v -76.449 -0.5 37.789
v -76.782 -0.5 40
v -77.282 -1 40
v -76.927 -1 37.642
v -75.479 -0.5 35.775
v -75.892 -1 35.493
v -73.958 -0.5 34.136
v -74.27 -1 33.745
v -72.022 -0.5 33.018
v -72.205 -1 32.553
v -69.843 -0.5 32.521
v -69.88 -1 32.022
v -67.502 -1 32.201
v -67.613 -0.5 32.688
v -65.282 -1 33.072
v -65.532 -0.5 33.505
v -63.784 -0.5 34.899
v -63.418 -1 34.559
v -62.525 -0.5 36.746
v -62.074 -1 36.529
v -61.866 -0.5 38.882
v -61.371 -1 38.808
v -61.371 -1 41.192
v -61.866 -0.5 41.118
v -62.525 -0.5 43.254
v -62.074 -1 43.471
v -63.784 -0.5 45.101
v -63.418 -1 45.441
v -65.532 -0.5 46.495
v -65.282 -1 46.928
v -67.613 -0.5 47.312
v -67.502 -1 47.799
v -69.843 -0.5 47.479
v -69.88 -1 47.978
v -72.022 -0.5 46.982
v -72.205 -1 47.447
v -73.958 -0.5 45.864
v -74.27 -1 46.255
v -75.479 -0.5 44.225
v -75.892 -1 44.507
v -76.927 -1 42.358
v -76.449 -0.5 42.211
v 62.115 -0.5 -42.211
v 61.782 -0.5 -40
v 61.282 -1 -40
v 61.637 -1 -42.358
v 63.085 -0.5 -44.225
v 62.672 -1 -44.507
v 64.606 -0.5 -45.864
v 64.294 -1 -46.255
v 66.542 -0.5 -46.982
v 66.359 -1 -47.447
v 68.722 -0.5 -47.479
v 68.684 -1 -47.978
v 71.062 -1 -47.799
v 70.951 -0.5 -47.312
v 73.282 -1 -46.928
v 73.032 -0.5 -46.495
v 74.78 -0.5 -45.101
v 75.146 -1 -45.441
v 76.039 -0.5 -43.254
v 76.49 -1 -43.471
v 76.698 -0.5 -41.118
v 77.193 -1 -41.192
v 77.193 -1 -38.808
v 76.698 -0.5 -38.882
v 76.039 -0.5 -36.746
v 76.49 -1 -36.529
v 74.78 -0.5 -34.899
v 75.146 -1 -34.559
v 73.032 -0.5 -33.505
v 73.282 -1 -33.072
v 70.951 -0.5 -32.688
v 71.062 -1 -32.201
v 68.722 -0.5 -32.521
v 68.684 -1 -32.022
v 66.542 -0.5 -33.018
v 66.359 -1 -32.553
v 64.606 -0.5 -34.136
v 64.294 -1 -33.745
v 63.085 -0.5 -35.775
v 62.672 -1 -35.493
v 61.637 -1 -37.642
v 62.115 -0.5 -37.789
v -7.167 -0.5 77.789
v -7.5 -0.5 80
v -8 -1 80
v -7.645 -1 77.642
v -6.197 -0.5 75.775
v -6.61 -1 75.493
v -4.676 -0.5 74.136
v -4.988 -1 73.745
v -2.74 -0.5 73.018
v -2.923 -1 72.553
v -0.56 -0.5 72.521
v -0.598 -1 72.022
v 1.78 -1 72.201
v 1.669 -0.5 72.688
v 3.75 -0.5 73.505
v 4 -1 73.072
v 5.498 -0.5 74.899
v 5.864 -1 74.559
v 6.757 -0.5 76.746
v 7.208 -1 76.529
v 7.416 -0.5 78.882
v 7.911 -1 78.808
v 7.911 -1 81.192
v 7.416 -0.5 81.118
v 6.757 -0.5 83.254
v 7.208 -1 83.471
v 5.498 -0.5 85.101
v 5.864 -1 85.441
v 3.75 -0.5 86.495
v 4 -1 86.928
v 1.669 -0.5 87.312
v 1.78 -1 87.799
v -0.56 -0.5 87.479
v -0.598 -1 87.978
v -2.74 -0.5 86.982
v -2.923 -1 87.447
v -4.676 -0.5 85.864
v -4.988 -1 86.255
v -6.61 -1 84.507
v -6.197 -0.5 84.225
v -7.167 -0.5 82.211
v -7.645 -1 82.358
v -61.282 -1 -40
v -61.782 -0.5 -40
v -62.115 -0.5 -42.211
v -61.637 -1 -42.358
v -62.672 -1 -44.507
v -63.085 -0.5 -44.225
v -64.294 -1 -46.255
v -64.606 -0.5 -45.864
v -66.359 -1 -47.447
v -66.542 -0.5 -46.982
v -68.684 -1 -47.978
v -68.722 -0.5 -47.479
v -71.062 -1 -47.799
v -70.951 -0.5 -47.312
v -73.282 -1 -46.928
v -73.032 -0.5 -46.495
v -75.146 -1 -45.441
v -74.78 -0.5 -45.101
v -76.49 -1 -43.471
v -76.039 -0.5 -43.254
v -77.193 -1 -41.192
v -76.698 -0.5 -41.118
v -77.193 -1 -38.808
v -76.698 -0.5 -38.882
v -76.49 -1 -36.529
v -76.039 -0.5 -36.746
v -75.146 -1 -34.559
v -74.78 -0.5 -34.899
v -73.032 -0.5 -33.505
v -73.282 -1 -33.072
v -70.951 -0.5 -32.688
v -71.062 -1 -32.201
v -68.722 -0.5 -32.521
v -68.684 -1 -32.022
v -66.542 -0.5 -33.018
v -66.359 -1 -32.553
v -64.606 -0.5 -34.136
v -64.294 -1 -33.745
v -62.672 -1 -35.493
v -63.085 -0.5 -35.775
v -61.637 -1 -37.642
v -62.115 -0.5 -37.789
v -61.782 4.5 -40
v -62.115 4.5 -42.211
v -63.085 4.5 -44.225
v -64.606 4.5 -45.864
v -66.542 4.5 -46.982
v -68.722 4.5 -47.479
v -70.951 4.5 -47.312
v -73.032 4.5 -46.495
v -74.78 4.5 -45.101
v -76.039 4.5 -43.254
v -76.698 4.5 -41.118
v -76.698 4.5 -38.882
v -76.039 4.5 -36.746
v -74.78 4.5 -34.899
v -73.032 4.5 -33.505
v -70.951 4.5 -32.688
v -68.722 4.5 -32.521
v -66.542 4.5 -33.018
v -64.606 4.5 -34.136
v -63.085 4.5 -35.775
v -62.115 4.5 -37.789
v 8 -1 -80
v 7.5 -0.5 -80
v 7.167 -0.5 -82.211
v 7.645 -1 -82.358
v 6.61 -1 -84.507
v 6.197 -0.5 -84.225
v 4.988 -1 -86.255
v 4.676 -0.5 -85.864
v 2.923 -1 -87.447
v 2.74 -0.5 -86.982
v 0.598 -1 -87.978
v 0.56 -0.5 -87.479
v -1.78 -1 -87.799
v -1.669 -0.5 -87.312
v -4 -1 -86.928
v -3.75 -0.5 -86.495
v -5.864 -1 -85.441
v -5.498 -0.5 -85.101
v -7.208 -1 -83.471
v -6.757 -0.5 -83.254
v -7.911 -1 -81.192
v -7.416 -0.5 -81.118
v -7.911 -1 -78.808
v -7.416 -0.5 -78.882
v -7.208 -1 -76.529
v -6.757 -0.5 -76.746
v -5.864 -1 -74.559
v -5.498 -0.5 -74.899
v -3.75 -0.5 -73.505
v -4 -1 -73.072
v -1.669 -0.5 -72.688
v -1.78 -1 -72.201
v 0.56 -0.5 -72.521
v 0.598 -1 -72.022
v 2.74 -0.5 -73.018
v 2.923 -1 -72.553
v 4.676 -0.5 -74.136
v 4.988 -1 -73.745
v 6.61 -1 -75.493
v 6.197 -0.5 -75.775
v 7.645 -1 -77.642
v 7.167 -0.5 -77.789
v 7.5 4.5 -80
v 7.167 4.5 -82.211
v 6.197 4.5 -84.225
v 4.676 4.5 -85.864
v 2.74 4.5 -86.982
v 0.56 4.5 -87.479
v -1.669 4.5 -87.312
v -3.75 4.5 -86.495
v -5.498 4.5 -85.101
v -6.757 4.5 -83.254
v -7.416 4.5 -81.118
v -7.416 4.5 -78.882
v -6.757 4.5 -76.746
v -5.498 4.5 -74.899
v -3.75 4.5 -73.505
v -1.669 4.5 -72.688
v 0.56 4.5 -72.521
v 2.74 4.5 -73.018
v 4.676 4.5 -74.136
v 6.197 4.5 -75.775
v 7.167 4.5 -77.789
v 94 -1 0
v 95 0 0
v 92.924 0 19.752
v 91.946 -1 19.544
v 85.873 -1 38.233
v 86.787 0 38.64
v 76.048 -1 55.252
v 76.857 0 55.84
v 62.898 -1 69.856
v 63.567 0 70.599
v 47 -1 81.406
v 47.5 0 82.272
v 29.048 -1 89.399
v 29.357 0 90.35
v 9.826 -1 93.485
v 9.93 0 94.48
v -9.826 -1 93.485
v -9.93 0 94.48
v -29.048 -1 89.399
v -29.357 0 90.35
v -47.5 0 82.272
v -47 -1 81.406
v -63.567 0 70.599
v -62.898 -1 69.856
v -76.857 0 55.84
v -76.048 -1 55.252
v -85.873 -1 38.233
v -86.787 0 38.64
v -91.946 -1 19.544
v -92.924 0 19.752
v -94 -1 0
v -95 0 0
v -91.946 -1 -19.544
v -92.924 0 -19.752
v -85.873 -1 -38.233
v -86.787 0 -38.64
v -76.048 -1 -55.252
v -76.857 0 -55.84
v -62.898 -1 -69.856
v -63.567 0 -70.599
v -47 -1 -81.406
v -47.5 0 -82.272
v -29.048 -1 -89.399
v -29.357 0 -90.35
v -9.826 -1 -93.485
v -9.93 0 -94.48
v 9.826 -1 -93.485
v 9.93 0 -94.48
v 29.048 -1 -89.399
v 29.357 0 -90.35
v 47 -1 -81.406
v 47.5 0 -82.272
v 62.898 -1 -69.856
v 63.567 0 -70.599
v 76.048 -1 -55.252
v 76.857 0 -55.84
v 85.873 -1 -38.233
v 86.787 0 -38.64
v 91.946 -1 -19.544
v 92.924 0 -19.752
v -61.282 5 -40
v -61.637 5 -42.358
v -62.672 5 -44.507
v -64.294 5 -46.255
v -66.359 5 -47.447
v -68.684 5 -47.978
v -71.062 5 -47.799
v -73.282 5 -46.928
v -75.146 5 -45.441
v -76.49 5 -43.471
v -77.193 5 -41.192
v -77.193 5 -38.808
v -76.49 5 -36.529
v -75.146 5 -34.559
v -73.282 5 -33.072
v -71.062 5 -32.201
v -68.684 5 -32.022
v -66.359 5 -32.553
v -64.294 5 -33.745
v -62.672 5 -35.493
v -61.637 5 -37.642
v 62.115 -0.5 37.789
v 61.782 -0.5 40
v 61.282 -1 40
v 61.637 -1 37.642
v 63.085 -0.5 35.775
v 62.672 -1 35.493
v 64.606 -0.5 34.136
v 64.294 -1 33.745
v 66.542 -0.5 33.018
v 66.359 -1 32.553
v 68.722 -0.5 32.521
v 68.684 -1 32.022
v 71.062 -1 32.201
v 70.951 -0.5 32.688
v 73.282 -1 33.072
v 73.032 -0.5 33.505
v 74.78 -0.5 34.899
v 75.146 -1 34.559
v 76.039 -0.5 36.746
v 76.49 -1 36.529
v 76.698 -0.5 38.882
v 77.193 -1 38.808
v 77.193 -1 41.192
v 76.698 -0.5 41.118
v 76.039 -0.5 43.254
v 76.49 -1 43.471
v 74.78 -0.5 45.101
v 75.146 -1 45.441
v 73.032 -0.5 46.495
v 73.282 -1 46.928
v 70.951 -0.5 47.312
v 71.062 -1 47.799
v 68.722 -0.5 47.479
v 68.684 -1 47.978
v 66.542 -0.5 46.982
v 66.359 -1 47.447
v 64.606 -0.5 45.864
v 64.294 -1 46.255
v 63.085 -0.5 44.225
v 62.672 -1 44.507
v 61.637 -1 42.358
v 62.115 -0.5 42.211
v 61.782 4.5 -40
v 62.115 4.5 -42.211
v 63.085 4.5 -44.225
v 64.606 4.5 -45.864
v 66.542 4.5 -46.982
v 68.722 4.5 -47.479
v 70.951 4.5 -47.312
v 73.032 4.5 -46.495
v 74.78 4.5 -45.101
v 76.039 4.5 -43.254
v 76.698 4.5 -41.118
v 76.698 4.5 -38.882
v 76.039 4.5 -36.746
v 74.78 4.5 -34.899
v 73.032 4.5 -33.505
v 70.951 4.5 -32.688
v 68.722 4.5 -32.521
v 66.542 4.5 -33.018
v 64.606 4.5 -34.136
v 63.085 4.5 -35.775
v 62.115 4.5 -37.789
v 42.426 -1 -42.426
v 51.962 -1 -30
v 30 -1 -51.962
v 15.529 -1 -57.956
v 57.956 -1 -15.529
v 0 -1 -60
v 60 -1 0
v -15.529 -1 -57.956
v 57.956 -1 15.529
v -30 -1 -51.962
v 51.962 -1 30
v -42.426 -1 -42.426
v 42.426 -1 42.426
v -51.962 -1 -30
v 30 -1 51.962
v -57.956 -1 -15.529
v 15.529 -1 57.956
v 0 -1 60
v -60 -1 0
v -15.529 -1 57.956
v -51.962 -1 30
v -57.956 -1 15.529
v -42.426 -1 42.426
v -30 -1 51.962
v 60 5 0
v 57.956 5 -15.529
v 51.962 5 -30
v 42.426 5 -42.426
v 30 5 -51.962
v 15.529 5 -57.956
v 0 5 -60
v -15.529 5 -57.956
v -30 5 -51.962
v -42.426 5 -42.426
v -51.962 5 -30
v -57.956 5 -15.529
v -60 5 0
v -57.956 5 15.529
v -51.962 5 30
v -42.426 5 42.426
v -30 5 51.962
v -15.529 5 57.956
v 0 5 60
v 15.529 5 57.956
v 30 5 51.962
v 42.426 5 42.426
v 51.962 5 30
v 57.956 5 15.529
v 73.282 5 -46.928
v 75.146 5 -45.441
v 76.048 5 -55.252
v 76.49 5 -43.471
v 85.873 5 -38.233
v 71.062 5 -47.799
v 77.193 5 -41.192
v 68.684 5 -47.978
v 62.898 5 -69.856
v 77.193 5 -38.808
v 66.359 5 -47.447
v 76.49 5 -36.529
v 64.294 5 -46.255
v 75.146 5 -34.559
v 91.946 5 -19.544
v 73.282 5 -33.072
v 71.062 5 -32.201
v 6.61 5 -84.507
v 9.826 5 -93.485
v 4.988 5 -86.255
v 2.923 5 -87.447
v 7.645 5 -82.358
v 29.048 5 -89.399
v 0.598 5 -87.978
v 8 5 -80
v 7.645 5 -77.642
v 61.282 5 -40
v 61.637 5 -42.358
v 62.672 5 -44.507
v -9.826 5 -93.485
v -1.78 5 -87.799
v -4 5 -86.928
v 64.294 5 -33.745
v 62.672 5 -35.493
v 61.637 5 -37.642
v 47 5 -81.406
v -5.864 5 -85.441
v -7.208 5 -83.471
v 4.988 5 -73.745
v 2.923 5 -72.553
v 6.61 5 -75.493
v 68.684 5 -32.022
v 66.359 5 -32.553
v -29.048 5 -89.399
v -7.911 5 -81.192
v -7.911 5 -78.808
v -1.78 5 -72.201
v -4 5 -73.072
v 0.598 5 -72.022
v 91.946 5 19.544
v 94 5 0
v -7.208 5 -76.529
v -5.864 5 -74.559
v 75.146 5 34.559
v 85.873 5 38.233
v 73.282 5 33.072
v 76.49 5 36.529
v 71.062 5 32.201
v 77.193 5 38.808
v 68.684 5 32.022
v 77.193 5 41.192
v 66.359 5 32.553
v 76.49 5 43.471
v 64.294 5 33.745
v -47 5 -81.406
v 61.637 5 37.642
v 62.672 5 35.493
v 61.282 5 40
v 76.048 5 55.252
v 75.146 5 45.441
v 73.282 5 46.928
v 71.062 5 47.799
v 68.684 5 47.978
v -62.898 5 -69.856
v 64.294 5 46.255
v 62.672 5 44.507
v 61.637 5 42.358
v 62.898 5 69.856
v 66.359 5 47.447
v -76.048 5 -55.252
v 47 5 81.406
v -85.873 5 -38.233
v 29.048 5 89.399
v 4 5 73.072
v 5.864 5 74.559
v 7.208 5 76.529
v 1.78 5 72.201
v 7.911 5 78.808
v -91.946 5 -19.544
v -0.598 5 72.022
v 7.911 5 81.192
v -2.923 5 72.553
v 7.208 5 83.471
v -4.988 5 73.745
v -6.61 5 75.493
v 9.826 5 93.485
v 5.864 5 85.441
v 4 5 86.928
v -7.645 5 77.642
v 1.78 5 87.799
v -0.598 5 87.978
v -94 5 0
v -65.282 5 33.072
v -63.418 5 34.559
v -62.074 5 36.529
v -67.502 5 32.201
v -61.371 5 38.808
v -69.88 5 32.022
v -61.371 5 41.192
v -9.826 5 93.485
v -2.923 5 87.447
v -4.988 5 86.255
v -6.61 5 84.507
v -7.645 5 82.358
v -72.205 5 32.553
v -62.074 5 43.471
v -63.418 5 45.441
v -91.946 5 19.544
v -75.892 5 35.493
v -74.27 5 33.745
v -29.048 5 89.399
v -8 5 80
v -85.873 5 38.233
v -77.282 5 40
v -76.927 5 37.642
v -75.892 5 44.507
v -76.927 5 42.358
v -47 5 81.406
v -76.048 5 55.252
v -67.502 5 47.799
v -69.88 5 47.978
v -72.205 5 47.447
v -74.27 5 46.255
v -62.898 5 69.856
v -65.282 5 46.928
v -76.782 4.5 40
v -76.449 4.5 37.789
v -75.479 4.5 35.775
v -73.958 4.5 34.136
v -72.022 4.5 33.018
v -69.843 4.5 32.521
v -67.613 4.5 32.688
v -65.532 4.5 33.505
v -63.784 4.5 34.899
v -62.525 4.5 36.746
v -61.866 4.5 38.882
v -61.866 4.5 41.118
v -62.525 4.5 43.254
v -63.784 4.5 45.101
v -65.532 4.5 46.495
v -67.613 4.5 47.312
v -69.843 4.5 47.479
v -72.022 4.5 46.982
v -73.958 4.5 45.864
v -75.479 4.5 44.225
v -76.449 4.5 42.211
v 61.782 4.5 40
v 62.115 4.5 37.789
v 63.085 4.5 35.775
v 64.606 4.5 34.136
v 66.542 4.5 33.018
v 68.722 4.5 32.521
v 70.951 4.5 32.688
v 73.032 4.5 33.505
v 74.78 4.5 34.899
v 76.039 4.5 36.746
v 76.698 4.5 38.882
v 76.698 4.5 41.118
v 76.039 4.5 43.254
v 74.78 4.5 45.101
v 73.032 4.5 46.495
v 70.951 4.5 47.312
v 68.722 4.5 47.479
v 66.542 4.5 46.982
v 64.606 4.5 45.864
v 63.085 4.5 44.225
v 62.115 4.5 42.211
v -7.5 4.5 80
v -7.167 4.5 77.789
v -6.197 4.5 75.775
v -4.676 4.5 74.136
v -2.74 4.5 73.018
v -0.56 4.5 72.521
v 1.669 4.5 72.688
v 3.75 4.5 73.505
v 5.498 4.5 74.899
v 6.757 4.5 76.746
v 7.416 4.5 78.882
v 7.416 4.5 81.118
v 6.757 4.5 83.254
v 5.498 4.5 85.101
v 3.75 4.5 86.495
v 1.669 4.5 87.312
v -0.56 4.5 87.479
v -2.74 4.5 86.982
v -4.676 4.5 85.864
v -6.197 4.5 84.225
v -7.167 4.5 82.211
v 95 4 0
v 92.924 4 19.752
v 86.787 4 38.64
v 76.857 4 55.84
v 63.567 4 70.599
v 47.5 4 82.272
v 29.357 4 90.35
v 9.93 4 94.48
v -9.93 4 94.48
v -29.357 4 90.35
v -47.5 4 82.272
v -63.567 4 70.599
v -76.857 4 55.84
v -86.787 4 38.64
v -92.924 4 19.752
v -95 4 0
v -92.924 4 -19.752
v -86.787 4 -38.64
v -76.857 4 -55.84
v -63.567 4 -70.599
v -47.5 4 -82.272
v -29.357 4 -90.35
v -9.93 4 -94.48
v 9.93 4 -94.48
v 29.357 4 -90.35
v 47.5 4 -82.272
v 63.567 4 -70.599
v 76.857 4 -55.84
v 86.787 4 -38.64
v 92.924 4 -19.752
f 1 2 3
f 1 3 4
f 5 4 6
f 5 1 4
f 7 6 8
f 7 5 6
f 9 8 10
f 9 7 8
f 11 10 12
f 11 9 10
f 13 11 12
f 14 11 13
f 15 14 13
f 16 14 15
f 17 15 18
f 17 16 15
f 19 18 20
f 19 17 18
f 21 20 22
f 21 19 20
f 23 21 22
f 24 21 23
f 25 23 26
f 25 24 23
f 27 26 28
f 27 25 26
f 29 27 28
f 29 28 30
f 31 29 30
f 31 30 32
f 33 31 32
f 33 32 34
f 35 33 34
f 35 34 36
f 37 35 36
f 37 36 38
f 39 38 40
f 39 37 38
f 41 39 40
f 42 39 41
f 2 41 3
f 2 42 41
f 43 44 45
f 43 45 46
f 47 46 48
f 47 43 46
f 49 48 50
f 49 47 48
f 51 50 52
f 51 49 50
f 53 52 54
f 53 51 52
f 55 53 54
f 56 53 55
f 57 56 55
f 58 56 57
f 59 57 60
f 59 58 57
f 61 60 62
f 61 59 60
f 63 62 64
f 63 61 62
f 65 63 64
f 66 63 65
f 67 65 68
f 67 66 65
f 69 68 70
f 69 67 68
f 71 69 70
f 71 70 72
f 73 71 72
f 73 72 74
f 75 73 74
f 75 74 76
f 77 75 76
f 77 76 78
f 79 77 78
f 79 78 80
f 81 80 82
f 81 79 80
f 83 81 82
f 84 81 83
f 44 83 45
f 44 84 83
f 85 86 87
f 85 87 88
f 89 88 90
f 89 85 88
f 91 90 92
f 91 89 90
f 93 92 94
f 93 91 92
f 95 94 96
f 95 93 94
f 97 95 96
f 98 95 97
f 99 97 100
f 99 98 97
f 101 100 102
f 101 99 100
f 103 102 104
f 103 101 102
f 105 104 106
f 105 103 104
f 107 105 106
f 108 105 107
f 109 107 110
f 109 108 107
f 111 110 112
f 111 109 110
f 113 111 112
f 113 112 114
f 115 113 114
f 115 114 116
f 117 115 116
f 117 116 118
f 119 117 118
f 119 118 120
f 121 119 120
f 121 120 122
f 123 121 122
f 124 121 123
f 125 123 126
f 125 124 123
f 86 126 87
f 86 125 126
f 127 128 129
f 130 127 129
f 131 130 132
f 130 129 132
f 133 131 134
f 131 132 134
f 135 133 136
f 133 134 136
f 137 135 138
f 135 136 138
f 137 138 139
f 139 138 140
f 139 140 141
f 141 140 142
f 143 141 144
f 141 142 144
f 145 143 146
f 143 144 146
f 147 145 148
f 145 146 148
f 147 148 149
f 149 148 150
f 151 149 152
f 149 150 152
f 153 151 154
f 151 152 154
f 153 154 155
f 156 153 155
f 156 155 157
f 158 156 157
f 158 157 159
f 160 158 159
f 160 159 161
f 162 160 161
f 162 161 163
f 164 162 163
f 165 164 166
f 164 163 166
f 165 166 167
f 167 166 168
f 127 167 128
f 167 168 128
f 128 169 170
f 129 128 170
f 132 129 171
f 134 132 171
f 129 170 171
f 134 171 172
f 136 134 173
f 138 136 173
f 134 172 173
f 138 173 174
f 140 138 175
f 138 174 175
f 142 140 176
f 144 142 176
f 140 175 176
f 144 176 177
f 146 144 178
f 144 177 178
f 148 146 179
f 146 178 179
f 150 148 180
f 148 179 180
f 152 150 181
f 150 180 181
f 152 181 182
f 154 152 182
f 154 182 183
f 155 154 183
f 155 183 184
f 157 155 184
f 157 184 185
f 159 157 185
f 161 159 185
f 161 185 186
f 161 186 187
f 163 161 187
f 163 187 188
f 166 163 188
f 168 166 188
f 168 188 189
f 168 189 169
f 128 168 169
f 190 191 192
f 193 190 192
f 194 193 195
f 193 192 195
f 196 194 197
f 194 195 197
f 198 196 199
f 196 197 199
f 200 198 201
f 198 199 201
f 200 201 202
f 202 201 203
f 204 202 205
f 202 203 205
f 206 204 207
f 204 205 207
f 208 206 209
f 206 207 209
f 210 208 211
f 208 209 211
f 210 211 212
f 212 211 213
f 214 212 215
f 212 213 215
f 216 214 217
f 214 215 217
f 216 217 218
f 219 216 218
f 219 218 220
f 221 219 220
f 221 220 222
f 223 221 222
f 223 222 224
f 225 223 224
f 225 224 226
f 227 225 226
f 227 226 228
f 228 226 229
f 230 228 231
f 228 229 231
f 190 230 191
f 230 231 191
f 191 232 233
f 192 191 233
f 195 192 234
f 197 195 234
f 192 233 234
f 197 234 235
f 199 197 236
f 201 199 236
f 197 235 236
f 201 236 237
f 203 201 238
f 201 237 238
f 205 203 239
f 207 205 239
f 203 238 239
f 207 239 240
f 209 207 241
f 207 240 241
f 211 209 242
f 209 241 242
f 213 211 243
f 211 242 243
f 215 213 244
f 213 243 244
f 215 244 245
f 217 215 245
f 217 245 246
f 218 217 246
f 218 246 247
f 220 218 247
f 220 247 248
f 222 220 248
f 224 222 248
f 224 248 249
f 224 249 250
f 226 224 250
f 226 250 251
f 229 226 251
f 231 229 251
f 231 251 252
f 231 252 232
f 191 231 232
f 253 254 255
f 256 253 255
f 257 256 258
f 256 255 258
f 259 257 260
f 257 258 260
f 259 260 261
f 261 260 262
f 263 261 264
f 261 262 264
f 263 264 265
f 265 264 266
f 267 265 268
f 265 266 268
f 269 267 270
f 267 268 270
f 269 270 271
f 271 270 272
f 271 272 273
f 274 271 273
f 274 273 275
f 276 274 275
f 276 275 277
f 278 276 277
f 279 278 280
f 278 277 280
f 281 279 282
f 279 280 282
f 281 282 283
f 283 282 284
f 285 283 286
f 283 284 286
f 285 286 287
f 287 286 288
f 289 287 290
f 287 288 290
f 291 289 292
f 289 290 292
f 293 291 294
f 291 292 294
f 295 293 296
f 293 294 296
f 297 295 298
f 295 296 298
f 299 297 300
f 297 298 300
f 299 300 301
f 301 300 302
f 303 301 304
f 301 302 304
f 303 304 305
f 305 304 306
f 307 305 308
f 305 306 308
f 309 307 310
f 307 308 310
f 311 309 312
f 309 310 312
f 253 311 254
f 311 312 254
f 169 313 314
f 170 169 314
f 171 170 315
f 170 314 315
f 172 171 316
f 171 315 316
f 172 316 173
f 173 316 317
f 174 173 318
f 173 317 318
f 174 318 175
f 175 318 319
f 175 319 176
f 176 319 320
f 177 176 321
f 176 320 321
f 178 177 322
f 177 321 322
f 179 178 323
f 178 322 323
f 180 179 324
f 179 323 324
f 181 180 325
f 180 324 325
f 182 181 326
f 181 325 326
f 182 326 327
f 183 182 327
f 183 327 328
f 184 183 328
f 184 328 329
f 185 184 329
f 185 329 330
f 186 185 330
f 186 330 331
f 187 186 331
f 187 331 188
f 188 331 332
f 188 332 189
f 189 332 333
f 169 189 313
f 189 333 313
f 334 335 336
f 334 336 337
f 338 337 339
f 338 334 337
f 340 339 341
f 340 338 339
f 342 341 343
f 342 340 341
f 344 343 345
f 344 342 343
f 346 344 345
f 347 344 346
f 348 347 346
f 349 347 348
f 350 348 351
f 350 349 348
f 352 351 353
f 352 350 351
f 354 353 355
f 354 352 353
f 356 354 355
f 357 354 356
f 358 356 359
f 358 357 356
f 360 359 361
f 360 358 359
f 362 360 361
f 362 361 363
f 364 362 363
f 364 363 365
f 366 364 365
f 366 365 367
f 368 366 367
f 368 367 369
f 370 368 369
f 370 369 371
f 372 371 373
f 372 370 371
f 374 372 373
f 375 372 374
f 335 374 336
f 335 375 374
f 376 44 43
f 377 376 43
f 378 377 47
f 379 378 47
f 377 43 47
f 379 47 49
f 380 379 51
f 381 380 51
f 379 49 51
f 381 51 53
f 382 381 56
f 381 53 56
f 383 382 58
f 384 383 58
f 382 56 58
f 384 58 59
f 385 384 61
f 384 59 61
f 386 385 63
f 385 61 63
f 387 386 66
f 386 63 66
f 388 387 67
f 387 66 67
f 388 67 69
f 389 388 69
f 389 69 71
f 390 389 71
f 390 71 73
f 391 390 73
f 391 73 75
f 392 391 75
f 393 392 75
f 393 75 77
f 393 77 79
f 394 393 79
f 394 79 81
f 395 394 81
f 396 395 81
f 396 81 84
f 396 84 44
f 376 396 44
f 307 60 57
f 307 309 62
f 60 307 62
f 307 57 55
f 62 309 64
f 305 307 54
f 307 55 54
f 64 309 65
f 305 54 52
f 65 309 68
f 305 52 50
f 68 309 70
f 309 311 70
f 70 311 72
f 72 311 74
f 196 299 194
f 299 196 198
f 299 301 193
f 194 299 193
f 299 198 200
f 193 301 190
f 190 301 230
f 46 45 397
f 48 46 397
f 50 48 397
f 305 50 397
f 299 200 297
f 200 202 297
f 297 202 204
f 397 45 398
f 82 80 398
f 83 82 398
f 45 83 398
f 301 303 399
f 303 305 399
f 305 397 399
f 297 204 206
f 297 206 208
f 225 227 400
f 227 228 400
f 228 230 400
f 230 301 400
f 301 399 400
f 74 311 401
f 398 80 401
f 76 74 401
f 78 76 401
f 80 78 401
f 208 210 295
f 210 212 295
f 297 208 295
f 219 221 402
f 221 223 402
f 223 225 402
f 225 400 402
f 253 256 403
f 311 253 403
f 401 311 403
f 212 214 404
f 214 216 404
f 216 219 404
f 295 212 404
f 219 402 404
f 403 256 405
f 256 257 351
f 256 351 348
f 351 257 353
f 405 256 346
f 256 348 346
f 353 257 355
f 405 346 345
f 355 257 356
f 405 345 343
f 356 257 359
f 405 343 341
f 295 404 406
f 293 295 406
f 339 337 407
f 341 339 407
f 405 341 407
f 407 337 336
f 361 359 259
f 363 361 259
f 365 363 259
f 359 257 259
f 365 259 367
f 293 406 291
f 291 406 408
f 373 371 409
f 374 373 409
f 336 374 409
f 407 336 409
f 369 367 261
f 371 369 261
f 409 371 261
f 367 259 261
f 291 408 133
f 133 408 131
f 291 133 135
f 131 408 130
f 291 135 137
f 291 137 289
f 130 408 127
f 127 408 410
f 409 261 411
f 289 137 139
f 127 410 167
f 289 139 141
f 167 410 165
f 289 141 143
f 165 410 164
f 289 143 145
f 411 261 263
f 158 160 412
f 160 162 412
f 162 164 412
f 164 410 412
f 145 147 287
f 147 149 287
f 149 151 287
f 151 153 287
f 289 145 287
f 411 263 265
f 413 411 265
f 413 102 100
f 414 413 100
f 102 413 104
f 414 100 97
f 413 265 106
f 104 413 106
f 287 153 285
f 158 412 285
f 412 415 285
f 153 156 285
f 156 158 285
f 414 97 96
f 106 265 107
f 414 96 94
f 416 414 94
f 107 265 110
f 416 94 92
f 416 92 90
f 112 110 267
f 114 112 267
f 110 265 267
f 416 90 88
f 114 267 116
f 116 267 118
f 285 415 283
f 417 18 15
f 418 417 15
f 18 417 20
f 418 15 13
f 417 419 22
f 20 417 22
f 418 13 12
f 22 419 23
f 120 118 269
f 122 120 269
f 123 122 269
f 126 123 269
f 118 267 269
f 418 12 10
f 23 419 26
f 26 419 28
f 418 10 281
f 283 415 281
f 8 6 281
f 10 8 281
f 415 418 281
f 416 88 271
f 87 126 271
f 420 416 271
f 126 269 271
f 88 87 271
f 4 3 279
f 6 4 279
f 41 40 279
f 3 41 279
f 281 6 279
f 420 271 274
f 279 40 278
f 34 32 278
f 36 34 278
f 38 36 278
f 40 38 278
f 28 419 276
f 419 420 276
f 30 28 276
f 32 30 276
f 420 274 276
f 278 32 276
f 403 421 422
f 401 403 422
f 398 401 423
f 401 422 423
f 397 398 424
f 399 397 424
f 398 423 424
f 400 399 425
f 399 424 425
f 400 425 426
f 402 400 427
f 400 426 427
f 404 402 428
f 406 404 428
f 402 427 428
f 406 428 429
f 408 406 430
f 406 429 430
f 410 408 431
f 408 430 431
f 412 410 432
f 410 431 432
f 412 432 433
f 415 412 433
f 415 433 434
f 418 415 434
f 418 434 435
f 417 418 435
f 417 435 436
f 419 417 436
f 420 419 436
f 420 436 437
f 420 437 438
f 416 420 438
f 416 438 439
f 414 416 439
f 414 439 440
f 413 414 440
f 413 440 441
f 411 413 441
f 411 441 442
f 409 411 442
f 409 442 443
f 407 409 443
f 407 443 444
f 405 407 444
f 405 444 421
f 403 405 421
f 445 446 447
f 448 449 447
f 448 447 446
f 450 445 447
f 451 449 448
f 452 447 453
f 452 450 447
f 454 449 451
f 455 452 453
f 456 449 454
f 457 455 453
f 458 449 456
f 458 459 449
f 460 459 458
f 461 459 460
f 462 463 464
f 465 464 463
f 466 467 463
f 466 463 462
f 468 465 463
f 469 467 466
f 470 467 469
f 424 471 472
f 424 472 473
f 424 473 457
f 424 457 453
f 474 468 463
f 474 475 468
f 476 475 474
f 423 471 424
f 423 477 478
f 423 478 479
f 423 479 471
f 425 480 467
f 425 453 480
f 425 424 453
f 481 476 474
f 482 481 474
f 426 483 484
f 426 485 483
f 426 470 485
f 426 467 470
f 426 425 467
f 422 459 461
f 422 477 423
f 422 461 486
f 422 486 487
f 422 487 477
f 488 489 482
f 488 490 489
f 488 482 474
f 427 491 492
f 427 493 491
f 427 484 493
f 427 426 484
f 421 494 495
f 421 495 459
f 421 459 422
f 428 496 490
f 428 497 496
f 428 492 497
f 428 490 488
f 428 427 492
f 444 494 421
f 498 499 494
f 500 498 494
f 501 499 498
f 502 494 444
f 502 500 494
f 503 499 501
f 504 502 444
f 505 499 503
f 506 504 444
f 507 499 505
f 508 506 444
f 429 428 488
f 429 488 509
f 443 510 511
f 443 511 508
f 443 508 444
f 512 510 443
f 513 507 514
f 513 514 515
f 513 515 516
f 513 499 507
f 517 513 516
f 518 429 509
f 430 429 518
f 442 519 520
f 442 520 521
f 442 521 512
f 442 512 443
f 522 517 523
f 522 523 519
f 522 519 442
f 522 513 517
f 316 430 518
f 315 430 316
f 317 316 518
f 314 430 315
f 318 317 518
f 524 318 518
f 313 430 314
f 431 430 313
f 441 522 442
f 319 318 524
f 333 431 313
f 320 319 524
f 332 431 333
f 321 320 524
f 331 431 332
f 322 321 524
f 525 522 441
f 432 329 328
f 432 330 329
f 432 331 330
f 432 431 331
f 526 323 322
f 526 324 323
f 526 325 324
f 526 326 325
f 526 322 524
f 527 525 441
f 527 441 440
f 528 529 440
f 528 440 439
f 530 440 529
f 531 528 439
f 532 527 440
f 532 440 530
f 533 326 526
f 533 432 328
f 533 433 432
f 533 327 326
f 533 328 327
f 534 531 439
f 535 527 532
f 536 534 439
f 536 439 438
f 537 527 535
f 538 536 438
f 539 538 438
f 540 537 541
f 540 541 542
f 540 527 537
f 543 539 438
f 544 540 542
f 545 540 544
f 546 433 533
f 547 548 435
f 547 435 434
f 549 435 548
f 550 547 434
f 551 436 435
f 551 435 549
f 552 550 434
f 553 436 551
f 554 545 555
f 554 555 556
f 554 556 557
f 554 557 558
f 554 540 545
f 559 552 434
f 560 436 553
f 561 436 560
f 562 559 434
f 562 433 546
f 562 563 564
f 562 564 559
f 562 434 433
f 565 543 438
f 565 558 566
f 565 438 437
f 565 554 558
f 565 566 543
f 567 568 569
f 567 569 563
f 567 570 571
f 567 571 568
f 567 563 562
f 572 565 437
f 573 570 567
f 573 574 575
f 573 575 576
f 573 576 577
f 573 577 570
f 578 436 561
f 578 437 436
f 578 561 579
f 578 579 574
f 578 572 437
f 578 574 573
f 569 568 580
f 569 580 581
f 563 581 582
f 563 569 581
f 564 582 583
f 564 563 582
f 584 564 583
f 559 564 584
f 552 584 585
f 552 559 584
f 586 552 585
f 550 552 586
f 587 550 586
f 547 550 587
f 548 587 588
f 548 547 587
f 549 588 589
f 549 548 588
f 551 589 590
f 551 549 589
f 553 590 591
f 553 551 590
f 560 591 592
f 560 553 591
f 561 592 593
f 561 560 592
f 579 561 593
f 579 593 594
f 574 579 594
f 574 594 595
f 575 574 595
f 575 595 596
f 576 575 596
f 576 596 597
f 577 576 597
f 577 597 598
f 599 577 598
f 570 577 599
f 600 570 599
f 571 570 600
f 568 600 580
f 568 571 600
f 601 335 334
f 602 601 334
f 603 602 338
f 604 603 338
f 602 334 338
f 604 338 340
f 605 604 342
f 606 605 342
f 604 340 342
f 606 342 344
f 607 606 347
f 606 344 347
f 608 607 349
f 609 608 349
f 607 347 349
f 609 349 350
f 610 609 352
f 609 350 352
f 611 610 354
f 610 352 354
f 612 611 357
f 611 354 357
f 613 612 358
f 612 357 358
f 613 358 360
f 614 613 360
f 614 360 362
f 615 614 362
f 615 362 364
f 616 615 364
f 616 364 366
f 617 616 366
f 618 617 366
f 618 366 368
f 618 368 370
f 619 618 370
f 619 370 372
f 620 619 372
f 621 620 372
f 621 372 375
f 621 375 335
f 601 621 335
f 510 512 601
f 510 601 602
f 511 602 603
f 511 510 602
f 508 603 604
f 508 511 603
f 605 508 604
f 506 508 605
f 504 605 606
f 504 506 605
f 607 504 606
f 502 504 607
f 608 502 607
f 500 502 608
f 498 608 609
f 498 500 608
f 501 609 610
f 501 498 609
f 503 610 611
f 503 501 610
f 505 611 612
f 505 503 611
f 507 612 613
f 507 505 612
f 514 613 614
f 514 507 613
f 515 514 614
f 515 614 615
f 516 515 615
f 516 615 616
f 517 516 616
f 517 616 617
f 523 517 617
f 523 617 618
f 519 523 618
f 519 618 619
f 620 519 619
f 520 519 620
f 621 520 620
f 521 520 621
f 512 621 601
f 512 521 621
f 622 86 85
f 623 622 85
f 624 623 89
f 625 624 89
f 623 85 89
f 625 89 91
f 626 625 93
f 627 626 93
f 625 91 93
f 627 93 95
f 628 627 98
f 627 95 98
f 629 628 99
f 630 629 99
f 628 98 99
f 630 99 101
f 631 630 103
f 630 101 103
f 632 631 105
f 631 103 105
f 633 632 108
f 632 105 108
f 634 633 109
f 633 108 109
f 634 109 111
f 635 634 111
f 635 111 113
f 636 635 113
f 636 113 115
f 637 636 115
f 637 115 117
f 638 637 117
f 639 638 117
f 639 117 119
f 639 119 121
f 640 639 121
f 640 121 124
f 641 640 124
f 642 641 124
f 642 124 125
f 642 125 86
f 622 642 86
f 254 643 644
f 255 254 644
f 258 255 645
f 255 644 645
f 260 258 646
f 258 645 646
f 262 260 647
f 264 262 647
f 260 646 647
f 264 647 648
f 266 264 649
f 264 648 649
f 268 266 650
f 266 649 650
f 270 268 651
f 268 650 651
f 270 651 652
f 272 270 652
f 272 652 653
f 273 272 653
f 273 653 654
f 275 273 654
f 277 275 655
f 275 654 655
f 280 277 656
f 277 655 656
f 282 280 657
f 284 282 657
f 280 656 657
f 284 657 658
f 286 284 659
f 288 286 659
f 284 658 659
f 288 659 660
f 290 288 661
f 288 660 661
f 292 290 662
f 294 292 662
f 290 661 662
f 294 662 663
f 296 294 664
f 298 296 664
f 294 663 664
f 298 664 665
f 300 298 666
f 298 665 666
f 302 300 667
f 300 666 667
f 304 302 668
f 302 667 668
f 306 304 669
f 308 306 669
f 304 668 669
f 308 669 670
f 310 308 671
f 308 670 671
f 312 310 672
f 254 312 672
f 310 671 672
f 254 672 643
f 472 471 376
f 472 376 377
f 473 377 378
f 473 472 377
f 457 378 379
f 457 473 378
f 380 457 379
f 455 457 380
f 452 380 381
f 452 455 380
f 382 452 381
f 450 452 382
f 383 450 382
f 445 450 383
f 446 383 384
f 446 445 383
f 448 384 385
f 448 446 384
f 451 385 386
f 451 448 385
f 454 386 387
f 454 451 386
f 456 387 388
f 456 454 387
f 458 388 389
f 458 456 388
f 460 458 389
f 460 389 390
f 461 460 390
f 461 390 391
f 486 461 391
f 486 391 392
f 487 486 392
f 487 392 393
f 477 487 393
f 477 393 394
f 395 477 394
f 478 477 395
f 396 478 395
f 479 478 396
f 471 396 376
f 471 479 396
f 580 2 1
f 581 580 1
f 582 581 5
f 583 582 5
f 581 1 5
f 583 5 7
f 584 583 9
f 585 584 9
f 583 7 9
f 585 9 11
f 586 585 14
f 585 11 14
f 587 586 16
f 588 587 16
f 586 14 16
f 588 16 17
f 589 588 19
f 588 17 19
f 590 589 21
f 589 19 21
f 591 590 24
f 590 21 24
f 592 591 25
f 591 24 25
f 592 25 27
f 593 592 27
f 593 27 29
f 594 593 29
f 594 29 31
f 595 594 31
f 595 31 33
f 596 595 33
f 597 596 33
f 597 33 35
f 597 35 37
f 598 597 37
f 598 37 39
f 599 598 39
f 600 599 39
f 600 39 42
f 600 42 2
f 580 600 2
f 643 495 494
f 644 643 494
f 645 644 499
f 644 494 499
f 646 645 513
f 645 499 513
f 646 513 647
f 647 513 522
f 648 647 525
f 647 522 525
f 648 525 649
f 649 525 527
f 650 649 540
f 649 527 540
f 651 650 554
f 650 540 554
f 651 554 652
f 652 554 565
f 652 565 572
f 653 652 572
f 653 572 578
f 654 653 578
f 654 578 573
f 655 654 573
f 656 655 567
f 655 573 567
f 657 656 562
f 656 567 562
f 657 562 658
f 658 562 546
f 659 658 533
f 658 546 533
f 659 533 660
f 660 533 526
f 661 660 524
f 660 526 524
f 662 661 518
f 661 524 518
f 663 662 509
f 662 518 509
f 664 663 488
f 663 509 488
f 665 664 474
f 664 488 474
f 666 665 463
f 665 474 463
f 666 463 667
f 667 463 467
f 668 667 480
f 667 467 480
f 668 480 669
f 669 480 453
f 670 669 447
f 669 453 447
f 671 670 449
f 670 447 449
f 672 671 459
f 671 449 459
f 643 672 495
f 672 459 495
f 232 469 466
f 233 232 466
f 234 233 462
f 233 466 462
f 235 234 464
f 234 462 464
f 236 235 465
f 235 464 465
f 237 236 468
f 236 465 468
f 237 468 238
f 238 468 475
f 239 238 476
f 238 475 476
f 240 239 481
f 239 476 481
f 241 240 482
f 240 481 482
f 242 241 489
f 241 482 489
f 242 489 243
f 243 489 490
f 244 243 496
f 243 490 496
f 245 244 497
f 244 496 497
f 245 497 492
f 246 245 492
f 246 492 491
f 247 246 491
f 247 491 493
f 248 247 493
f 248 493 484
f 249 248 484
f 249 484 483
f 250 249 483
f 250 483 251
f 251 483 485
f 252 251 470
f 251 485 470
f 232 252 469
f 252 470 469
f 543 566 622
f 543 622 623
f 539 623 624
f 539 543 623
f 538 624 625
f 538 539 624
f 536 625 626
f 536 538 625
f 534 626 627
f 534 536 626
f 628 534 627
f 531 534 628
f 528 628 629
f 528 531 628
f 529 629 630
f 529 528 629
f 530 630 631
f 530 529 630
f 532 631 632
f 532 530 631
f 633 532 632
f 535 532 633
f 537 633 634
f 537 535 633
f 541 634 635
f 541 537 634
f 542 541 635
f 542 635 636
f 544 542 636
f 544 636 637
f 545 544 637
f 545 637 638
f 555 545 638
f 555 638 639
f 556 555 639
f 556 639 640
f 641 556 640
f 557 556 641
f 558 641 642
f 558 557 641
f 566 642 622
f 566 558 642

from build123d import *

# Parameters (mm, degrees)
SKETCH1_W                = 95
SKETCH1_H                = 6
HOLE1_D                  = 120
F_9_16_CLEARANCE_HOLE1_D = 15
F_9_16_CLEARANCE_HOLE2_D = 15
CHAMFER1_SIZE            = 0.5
CHAMFER2_SIZE            = 1


with BuildPart() as part:
    # Sketch1 → Revolve1 (revolve)
    with BuildSketch(Plane.XY):
        with Locations((47.5, 2)):
            Rectangle(SKETCH1_W, SKETCH1_H)
    revolve(axis=Axis((0, 5, 0), (0, -1, 0)))

    # Hole1 (through all)
    with Locations(Plane(origin=(0, -1, 0), x_dir=(-1, 0, 0), z_dir=(0, -1, 0))):
        with Locations((0, 0)):
            Hole(HOLE1_D / 2)

    # 9/16 Clearance Hole1 (through all)
    with Locations(Plane(origin=(0, -1, 0), x_dir=(-1, 0, 0), z_dir=(0, -1, 0))):
        with Locations((69.282032303, 40), (0, 80)):
            Hole(F_9_16_CLEARANCE_HOLE1_D / 2)

    # 9/16 Clearance Hole2 (through all)
    with Locations(Plane(origin=(0, 5, 0), x_dir=(1, 0, 0), z_dir=(0, 1, 0))):
        with Locations((-69.282032303, -40), (69.282032303, 40), (69.282032303, -40), (0, -80)):
            Hole(F_9_16_CLEARANCE_HOLE2_D / 2)

    # Chamfer1
    chamfer1_edges = [part.edges().sort_by_distance(p)[0] for p in [
        (-7.5, -1, -80),
        (-7.5, 5, -80),
        (-76.782032303, -1, -40),
        (-76.782032303, 5, -40),
        (7.5, 5, 80),
        (7.5, -1, 80),
        (76.782032303, 5, 40),
        (76.782032303, -1, 40),
        (76.782032303, 5, -40),
        (76.782032303, -1, -40),
        (-61.782032303, 5, 40),
        (-61.782032303, -1, 40),
    ]]
    chamfer(chamfer1_edges, length=CHAMFER1_SIZE)

    # Chamfer2
    chamfer2_edges = [part.edges().sort_by_distance(p)[0] for p in [
        (-95, -1, 0),
        (-95, 5, 0),
    ]]
    chamfer(chamfer2_edges, length=CHAMFER2_SIZE)


solid = part.part
